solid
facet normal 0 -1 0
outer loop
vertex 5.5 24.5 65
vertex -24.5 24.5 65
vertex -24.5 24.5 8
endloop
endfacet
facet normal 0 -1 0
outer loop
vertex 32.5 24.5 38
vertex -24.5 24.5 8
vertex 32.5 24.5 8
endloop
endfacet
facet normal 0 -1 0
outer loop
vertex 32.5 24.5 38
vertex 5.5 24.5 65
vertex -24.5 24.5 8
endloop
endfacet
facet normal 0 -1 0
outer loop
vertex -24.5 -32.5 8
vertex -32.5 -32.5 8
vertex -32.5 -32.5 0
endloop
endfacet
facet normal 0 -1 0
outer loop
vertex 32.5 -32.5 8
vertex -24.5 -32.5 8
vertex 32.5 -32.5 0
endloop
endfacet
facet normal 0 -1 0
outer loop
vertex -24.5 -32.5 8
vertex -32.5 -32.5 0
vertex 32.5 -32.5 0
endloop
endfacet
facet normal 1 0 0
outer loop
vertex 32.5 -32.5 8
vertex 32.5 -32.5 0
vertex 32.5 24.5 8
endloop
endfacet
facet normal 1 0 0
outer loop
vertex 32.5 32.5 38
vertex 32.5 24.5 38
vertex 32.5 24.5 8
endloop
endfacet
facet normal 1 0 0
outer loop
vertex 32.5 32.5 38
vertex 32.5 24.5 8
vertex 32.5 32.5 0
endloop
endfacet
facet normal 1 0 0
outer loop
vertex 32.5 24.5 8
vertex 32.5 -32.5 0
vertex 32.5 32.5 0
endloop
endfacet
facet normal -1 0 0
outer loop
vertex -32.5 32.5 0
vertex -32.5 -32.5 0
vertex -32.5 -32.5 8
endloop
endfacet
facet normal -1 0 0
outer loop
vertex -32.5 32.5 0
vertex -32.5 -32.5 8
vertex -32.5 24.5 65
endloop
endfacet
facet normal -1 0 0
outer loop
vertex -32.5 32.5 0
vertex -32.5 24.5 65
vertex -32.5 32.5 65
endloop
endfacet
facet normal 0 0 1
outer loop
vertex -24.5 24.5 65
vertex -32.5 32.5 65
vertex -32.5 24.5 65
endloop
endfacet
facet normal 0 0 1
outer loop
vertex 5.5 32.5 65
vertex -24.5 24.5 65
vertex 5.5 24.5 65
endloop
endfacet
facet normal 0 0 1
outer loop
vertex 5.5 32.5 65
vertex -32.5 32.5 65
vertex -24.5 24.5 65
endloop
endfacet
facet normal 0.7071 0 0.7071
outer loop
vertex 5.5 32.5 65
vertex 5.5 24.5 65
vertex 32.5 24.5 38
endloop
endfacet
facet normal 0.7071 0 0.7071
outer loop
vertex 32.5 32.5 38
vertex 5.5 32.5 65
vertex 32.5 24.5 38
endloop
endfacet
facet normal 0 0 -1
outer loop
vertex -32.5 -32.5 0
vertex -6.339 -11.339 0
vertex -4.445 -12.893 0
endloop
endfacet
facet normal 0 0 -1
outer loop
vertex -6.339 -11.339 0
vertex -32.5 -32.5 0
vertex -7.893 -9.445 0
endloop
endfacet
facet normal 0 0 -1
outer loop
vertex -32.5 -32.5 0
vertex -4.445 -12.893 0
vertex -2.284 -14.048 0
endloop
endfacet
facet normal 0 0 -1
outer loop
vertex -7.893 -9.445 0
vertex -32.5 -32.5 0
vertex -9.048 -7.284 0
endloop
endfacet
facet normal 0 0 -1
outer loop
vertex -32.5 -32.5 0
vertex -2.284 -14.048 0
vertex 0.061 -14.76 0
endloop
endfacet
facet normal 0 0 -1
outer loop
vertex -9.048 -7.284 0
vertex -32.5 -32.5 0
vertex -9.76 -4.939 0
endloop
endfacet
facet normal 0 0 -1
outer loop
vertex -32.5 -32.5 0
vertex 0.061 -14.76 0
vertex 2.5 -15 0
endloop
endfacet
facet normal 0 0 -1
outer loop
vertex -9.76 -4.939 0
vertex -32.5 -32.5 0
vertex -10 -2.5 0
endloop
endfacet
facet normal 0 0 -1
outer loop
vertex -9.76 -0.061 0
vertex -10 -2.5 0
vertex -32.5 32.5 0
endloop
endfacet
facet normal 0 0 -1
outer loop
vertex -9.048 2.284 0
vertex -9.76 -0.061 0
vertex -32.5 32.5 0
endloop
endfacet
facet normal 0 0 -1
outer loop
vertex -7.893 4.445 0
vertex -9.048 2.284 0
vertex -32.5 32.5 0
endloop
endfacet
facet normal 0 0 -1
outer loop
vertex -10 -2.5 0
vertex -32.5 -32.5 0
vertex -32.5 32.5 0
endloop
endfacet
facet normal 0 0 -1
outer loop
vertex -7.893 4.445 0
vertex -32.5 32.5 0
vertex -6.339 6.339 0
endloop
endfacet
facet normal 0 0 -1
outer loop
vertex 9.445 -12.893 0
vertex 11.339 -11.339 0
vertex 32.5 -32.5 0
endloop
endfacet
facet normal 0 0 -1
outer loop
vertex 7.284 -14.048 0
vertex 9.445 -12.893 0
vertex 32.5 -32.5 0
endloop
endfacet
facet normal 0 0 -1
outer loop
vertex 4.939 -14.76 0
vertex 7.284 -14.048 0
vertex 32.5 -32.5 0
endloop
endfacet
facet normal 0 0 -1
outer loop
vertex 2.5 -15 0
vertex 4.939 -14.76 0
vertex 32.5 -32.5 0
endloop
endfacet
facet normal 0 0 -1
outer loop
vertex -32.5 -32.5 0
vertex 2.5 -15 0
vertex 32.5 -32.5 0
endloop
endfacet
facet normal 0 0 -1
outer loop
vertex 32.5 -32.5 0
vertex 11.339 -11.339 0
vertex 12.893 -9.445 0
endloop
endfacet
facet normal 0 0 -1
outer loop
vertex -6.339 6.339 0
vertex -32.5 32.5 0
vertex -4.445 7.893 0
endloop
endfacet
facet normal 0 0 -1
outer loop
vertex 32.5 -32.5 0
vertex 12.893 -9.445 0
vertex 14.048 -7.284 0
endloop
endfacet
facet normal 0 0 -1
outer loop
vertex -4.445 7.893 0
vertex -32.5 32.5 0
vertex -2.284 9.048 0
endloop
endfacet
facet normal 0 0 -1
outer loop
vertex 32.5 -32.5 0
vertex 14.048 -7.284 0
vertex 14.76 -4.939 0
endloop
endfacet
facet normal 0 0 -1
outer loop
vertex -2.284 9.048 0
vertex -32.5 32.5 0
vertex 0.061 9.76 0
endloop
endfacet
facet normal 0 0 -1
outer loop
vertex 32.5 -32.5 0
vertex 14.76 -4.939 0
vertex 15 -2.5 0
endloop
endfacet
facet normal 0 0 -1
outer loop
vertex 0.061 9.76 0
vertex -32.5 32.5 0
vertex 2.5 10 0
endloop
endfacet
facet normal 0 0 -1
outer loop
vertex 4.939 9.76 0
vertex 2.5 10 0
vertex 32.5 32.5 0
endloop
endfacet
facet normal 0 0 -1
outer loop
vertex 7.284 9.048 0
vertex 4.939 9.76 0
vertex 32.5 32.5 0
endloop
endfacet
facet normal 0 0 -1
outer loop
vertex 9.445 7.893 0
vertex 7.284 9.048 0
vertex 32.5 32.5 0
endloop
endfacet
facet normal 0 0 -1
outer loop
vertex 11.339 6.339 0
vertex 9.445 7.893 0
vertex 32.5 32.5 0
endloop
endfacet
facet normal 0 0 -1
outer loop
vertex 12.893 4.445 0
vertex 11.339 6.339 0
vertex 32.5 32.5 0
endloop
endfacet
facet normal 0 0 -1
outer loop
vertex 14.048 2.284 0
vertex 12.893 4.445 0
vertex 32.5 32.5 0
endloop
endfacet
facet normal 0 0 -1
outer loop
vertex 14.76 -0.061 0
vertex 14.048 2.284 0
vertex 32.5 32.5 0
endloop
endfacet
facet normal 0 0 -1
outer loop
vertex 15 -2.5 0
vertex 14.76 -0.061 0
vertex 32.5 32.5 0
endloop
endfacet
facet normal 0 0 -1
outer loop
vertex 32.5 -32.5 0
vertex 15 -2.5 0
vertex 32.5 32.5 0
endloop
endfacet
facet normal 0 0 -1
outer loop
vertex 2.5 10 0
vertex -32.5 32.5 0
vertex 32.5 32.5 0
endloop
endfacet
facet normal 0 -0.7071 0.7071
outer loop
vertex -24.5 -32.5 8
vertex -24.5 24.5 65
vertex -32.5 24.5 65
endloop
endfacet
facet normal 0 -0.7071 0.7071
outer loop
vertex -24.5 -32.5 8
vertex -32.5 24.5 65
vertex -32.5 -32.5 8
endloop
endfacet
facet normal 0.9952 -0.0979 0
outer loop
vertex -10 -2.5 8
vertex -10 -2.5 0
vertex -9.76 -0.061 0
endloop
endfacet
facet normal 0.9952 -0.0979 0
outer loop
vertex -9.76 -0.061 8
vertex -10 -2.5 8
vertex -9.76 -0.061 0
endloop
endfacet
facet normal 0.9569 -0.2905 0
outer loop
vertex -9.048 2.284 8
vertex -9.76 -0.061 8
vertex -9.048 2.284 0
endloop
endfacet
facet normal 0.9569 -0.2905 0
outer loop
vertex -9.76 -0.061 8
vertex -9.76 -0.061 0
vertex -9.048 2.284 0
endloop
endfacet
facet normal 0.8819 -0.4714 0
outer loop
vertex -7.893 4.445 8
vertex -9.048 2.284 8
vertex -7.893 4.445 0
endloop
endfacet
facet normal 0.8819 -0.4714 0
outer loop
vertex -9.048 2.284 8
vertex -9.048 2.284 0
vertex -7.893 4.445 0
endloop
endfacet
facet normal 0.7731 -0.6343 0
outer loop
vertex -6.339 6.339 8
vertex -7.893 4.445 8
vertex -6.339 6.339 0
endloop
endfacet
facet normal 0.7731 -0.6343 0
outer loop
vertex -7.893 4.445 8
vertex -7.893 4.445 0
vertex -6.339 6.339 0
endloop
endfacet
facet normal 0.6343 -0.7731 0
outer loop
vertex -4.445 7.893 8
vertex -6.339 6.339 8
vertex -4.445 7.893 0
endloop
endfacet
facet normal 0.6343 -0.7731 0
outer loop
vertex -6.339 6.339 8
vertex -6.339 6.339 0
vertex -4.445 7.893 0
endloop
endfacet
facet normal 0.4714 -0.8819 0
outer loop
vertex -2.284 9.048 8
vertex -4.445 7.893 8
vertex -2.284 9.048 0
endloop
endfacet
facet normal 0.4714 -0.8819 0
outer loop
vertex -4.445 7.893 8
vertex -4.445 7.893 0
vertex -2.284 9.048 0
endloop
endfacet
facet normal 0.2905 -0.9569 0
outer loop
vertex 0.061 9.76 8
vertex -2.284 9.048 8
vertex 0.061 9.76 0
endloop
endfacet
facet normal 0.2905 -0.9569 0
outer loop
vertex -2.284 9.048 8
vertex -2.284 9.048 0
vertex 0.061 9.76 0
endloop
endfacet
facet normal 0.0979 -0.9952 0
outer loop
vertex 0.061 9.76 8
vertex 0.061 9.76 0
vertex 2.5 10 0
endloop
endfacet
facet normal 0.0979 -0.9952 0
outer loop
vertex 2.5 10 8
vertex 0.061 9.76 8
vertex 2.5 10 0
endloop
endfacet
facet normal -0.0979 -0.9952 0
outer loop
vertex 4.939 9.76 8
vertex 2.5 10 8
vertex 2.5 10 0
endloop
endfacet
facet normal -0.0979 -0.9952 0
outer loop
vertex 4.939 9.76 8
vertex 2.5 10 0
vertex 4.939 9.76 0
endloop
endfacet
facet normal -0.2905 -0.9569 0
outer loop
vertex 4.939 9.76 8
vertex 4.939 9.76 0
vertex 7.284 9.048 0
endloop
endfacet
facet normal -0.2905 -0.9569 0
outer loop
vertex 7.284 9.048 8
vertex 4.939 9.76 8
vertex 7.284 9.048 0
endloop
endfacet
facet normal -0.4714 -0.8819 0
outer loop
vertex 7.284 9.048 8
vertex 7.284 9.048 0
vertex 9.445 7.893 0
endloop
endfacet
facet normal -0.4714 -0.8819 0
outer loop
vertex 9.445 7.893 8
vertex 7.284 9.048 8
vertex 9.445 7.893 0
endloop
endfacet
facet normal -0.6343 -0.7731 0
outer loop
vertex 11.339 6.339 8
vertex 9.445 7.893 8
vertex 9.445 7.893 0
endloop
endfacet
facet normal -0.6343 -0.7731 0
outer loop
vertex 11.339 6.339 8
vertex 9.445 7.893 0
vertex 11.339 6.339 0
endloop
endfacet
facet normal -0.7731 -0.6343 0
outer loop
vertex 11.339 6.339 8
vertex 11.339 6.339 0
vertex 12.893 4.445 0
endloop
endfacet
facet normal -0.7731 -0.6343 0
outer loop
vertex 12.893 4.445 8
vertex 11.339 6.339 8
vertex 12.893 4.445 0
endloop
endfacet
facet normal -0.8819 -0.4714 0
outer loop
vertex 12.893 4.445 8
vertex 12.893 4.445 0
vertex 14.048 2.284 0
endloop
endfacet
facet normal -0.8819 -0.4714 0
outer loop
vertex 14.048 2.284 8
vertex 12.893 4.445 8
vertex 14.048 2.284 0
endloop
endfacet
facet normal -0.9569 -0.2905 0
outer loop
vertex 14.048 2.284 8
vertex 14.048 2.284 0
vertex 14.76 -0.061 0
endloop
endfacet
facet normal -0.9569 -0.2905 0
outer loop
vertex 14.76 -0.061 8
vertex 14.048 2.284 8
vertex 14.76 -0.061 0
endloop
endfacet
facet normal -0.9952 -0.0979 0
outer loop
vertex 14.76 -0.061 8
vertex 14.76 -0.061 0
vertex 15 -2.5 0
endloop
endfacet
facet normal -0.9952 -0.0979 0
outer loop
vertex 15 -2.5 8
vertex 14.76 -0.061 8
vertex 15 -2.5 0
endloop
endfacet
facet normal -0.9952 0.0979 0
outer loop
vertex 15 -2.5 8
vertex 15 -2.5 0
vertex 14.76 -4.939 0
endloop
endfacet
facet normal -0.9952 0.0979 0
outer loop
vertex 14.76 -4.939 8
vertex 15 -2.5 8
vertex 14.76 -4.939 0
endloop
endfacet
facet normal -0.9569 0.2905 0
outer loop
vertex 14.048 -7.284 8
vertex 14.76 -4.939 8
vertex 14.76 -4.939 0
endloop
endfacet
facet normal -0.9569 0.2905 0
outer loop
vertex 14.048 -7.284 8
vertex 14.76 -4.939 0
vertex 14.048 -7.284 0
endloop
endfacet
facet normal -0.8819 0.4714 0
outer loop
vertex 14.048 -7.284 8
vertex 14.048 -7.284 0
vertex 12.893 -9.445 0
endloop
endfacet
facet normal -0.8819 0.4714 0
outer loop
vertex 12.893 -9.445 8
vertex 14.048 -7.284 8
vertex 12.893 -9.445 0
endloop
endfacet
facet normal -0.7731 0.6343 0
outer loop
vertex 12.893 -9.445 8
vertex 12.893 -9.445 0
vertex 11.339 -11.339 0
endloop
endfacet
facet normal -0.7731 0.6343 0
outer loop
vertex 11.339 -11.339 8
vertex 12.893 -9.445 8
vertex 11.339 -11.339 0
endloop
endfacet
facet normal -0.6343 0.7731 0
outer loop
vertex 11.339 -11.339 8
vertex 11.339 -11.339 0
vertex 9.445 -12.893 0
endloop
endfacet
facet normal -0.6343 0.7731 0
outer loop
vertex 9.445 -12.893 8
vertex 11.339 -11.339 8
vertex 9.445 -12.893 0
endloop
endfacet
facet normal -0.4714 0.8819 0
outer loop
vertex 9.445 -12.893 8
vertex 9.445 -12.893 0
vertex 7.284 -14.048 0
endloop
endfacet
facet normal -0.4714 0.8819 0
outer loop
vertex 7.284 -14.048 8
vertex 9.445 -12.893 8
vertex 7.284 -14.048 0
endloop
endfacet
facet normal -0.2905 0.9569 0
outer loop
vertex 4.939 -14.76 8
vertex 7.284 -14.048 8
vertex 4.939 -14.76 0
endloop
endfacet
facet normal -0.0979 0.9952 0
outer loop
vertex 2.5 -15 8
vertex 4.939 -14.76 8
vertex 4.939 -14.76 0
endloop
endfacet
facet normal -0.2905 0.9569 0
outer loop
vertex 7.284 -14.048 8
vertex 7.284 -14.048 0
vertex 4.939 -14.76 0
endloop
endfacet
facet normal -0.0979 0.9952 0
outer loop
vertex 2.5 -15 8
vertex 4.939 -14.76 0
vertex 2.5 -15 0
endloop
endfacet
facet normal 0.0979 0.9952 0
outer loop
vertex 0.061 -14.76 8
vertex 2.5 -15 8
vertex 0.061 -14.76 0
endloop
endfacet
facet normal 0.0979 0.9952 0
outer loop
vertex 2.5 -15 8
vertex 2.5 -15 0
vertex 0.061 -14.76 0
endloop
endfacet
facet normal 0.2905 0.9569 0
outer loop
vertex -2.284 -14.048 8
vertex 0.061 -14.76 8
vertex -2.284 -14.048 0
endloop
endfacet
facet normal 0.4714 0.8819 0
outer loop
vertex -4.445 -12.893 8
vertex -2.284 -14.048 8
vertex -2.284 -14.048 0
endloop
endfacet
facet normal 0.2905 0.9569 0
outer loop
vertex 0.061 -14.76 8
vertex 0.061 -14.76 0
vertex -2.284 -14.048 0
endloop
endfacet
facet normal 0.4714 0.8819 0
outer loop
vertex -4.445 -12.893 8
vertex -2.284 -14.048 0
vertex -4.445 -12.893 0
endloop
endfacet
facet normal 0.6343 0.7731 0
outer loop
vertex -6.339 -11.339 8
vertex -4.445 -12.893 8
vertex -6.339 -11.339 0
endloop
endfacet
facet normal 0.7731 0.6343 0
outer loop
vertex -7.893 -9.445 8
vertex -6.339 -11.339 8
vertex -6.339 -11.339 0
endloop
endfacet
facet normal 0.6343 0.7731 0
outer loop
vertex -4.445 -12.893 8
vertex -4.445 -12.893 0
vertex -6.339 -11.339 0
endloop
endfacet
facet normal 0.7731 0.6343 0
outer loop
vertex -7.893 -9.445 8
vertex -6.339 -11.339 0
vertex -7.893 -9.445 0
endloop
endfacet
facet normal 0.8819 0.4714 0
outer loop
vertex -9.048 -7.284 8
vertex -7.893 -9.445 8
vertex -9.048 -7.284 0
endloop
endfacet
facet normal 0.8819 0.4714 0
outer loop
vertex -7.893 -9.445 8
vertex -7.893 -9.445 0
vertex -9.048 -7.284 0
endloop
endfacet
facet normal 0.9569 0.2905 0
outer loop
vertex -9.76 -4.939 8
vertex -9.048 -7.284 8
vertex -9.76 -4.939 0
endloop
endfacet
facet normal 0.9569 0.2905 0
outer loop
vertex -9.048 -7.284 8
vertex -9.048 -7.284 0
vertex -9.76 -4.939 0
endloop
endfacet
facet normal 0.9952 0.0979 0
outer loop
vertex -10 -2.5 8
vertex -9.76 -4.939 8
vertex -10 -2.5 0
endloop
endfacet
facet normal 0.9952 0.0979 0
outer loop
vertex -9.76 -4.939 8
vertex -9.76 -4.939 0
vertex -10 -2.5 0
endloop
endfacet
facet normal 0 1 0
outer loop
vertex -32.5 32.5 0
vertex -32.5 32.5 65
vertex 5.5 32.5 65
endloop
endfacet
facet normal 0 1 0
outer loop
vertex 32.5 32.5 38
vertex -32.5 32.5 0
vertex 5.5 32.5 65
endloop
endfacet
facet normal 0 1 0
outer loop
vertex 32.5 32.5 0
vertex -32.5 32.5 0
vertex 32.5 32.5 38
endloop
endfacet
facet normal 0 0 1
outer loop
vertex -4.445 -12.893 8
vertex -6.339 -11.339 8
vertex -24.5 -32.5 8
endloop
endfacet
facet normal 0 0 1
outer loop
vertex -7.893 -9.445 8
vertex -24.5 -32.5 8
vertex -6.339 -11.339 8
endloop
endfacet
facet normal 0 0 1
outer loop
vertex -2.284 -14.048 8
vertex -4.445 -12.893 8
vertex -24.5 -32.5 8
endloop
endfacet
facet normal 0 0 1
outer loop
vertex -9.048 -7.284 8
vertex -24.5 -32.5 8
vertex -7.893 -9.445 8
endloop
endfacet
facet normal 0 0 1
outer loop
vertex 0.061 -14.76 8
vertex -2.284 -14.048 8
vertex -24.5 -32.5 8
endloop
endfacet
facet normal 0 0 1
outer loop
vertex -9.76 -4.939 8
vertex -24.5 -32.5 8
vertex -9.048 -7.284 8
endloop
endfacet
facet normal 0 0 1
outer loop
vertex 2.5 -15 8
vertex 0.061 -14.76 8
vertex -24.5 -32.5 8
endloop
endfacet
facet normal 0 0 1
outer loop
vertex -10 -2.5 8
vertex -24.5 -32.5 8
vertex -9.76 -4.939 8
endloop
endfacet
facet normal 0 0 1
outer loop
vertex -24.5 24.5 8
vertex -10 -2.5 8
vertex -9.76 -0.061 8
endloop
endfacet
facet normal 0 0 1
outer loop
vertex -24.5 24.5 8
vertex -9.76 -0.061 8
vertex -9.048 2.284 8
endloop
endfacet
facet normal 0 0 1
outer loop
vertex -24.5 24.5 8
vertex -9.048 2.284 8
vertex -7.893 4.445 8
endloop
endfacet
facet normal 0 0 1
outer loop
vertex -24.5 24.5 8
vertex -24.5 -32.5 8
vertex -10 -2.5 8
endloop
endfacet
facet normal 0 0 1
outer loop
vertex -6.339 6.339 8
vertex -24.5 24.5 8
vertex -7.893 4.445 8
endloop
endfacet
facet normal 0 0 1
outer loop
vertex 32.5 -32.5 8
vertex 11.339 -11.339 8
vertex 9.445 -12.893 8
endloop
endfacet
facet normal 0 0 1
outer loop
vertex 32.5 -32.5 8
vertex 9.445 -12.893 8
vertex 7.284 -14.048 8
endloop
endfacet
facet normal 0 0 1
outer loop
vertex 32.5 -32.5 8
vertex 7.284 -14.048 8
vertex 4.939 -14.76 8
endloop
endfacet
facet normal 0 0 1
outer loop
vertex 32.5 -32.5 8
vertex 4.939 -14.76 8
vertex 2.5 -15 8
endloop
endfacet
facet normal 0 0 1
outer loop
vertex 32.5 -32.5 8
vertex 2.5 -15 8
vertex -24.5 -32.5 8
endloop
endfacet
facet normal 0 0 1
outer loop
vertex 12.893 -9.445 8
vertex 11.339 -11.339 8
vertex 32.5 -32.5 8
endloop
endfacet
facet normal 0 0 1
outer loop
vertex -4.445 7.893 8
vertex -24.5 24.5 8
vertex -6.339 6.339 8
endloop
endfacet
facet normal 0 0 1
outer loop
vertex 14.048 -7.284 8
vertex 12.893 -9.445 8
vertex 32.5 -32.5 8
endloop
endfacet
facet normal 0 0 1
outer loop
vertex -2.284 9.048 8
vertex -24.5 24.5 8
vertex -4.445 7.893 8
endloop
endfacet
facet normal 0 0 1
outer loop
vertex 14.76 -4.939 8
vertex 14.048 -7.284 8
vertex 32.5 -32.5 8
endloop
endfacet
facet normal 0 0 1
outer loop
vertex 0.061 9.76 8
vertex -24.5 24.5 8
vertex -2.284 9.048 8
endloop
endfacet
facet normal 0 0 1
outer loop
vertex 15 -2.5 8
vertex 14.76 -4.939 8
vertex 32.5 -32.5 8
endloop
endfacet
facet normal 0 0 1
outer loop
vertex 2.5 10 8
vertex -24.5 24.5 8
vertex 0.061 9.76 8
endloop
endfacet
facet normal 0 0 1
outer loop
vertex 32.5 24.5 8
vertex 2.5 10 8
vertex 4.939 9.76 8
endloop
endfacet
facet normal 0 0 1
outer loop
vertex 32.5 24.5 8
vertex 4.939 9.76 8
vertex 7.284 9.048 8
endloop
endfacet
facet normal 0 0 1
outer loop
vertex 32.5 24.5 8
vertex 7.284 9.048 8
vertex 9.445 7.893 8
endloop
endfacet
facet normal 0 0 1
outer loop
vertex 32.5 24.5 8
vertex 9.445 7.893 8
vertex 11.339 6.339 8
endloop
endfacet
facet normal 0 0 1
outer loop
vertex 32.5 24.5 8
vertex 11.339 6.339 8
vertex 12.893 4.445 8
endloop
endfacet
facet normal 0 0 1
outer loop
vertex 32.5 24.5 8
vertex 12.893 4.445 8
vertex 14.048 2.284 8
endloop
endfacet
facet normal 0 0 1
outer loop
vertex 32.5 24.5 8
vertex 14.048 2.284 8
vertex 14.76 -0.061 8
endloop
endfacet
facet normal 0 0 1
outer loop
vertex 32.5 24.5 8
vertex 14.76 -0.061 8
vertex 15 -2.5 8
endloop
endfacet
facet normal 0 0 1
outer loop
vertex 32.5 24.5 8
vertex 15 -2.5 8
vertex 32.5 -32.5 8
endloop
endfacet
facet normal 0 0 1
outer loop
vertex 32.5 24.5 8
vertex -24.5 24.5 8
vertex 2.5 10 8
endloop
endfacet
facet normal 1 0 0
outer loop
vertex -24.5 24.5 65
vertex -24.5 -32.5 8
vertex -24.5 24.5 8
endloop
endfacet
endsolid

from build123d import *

# Parameters (mm, degrees)
SKETCH2_W           = 65
SKETCH2_H           = 65
BOSS_EXTRUDE1_DEPTH = 65
SKETCH3_W           = 57
SKETCH3_H           = 57
CUT_EXTRUDE1_DEPTH  = 57
CUT_EXTRUDE2_DEPTH  = 9
CUT_EXTRUDE3_DEPTH  = 9
SKETCH8_R           = 12.5
CUT_EXTRUDE4_DEPTH  = 66


with BuildPart() as part:
    # Sketch2 → Boss-Extrude1 (new body)
    with BuildSketch(Plane.XY):
        Rectangle(SKETCH2_W, SKETCH2_H)
    extrude(amount=BOSS_EXTRUDE1_DEPTH)

    # Sketch3 → Cut-Extrude1 (cut)
    with BuildSketch(Plane.XY.offset(65)):
        with Locations((4, -4)):
            Rectangle(SKETCH3_W, SKETCH3_H)
    extrude(amount=-CUT_EXTRUDE1_DEPTH, mode=Mode.SUBTRACT)

    # Sketch5 → Cut-Extrude2 (cut, through all)
    with BuildSketch(Plane(origin=(-24.5, 0, 0), x_dir=(0, 0, -1), z_dir=(1, 0, 0))):
        Polygon((-65, -32.5), (-65, 24.5), (-8, -32.5), align=None)
    extrude(amount=-CUT_EXTRUDE2_DEPTH, mode=Mode.SUBTRACT)

    # Sketch7 → Cut-Extrude3 (cut, through all)
    with BuildSketch(Plane(origin=(0, 24.5, 0), x_dir=(-1, 0, 0), z_dir=(0, -1, 0))):
        Polygon((-32.5, -65), (-5.5, -65), (-32.5, -38), align=None)
    extrude(amount=-CUT_EXTRUDE3_DEPTH, mode=Mode.SUBTRACT)

    # Sketch8 → Cut-Extrude4 (cut, through all)
    with BuildSketch(Plane(origin=(0, 0, 0), x_dir=(-1, 0, 0), z_dir=(0, 0, -1))):
        with Locations((-2.5, -2.5)):
            Circle(SKETCH8_R)
    extrude(amount=-CUT_EXTRUDE4_DEPTH, mode=Mode.SUBTRACT)


solid = part.part
